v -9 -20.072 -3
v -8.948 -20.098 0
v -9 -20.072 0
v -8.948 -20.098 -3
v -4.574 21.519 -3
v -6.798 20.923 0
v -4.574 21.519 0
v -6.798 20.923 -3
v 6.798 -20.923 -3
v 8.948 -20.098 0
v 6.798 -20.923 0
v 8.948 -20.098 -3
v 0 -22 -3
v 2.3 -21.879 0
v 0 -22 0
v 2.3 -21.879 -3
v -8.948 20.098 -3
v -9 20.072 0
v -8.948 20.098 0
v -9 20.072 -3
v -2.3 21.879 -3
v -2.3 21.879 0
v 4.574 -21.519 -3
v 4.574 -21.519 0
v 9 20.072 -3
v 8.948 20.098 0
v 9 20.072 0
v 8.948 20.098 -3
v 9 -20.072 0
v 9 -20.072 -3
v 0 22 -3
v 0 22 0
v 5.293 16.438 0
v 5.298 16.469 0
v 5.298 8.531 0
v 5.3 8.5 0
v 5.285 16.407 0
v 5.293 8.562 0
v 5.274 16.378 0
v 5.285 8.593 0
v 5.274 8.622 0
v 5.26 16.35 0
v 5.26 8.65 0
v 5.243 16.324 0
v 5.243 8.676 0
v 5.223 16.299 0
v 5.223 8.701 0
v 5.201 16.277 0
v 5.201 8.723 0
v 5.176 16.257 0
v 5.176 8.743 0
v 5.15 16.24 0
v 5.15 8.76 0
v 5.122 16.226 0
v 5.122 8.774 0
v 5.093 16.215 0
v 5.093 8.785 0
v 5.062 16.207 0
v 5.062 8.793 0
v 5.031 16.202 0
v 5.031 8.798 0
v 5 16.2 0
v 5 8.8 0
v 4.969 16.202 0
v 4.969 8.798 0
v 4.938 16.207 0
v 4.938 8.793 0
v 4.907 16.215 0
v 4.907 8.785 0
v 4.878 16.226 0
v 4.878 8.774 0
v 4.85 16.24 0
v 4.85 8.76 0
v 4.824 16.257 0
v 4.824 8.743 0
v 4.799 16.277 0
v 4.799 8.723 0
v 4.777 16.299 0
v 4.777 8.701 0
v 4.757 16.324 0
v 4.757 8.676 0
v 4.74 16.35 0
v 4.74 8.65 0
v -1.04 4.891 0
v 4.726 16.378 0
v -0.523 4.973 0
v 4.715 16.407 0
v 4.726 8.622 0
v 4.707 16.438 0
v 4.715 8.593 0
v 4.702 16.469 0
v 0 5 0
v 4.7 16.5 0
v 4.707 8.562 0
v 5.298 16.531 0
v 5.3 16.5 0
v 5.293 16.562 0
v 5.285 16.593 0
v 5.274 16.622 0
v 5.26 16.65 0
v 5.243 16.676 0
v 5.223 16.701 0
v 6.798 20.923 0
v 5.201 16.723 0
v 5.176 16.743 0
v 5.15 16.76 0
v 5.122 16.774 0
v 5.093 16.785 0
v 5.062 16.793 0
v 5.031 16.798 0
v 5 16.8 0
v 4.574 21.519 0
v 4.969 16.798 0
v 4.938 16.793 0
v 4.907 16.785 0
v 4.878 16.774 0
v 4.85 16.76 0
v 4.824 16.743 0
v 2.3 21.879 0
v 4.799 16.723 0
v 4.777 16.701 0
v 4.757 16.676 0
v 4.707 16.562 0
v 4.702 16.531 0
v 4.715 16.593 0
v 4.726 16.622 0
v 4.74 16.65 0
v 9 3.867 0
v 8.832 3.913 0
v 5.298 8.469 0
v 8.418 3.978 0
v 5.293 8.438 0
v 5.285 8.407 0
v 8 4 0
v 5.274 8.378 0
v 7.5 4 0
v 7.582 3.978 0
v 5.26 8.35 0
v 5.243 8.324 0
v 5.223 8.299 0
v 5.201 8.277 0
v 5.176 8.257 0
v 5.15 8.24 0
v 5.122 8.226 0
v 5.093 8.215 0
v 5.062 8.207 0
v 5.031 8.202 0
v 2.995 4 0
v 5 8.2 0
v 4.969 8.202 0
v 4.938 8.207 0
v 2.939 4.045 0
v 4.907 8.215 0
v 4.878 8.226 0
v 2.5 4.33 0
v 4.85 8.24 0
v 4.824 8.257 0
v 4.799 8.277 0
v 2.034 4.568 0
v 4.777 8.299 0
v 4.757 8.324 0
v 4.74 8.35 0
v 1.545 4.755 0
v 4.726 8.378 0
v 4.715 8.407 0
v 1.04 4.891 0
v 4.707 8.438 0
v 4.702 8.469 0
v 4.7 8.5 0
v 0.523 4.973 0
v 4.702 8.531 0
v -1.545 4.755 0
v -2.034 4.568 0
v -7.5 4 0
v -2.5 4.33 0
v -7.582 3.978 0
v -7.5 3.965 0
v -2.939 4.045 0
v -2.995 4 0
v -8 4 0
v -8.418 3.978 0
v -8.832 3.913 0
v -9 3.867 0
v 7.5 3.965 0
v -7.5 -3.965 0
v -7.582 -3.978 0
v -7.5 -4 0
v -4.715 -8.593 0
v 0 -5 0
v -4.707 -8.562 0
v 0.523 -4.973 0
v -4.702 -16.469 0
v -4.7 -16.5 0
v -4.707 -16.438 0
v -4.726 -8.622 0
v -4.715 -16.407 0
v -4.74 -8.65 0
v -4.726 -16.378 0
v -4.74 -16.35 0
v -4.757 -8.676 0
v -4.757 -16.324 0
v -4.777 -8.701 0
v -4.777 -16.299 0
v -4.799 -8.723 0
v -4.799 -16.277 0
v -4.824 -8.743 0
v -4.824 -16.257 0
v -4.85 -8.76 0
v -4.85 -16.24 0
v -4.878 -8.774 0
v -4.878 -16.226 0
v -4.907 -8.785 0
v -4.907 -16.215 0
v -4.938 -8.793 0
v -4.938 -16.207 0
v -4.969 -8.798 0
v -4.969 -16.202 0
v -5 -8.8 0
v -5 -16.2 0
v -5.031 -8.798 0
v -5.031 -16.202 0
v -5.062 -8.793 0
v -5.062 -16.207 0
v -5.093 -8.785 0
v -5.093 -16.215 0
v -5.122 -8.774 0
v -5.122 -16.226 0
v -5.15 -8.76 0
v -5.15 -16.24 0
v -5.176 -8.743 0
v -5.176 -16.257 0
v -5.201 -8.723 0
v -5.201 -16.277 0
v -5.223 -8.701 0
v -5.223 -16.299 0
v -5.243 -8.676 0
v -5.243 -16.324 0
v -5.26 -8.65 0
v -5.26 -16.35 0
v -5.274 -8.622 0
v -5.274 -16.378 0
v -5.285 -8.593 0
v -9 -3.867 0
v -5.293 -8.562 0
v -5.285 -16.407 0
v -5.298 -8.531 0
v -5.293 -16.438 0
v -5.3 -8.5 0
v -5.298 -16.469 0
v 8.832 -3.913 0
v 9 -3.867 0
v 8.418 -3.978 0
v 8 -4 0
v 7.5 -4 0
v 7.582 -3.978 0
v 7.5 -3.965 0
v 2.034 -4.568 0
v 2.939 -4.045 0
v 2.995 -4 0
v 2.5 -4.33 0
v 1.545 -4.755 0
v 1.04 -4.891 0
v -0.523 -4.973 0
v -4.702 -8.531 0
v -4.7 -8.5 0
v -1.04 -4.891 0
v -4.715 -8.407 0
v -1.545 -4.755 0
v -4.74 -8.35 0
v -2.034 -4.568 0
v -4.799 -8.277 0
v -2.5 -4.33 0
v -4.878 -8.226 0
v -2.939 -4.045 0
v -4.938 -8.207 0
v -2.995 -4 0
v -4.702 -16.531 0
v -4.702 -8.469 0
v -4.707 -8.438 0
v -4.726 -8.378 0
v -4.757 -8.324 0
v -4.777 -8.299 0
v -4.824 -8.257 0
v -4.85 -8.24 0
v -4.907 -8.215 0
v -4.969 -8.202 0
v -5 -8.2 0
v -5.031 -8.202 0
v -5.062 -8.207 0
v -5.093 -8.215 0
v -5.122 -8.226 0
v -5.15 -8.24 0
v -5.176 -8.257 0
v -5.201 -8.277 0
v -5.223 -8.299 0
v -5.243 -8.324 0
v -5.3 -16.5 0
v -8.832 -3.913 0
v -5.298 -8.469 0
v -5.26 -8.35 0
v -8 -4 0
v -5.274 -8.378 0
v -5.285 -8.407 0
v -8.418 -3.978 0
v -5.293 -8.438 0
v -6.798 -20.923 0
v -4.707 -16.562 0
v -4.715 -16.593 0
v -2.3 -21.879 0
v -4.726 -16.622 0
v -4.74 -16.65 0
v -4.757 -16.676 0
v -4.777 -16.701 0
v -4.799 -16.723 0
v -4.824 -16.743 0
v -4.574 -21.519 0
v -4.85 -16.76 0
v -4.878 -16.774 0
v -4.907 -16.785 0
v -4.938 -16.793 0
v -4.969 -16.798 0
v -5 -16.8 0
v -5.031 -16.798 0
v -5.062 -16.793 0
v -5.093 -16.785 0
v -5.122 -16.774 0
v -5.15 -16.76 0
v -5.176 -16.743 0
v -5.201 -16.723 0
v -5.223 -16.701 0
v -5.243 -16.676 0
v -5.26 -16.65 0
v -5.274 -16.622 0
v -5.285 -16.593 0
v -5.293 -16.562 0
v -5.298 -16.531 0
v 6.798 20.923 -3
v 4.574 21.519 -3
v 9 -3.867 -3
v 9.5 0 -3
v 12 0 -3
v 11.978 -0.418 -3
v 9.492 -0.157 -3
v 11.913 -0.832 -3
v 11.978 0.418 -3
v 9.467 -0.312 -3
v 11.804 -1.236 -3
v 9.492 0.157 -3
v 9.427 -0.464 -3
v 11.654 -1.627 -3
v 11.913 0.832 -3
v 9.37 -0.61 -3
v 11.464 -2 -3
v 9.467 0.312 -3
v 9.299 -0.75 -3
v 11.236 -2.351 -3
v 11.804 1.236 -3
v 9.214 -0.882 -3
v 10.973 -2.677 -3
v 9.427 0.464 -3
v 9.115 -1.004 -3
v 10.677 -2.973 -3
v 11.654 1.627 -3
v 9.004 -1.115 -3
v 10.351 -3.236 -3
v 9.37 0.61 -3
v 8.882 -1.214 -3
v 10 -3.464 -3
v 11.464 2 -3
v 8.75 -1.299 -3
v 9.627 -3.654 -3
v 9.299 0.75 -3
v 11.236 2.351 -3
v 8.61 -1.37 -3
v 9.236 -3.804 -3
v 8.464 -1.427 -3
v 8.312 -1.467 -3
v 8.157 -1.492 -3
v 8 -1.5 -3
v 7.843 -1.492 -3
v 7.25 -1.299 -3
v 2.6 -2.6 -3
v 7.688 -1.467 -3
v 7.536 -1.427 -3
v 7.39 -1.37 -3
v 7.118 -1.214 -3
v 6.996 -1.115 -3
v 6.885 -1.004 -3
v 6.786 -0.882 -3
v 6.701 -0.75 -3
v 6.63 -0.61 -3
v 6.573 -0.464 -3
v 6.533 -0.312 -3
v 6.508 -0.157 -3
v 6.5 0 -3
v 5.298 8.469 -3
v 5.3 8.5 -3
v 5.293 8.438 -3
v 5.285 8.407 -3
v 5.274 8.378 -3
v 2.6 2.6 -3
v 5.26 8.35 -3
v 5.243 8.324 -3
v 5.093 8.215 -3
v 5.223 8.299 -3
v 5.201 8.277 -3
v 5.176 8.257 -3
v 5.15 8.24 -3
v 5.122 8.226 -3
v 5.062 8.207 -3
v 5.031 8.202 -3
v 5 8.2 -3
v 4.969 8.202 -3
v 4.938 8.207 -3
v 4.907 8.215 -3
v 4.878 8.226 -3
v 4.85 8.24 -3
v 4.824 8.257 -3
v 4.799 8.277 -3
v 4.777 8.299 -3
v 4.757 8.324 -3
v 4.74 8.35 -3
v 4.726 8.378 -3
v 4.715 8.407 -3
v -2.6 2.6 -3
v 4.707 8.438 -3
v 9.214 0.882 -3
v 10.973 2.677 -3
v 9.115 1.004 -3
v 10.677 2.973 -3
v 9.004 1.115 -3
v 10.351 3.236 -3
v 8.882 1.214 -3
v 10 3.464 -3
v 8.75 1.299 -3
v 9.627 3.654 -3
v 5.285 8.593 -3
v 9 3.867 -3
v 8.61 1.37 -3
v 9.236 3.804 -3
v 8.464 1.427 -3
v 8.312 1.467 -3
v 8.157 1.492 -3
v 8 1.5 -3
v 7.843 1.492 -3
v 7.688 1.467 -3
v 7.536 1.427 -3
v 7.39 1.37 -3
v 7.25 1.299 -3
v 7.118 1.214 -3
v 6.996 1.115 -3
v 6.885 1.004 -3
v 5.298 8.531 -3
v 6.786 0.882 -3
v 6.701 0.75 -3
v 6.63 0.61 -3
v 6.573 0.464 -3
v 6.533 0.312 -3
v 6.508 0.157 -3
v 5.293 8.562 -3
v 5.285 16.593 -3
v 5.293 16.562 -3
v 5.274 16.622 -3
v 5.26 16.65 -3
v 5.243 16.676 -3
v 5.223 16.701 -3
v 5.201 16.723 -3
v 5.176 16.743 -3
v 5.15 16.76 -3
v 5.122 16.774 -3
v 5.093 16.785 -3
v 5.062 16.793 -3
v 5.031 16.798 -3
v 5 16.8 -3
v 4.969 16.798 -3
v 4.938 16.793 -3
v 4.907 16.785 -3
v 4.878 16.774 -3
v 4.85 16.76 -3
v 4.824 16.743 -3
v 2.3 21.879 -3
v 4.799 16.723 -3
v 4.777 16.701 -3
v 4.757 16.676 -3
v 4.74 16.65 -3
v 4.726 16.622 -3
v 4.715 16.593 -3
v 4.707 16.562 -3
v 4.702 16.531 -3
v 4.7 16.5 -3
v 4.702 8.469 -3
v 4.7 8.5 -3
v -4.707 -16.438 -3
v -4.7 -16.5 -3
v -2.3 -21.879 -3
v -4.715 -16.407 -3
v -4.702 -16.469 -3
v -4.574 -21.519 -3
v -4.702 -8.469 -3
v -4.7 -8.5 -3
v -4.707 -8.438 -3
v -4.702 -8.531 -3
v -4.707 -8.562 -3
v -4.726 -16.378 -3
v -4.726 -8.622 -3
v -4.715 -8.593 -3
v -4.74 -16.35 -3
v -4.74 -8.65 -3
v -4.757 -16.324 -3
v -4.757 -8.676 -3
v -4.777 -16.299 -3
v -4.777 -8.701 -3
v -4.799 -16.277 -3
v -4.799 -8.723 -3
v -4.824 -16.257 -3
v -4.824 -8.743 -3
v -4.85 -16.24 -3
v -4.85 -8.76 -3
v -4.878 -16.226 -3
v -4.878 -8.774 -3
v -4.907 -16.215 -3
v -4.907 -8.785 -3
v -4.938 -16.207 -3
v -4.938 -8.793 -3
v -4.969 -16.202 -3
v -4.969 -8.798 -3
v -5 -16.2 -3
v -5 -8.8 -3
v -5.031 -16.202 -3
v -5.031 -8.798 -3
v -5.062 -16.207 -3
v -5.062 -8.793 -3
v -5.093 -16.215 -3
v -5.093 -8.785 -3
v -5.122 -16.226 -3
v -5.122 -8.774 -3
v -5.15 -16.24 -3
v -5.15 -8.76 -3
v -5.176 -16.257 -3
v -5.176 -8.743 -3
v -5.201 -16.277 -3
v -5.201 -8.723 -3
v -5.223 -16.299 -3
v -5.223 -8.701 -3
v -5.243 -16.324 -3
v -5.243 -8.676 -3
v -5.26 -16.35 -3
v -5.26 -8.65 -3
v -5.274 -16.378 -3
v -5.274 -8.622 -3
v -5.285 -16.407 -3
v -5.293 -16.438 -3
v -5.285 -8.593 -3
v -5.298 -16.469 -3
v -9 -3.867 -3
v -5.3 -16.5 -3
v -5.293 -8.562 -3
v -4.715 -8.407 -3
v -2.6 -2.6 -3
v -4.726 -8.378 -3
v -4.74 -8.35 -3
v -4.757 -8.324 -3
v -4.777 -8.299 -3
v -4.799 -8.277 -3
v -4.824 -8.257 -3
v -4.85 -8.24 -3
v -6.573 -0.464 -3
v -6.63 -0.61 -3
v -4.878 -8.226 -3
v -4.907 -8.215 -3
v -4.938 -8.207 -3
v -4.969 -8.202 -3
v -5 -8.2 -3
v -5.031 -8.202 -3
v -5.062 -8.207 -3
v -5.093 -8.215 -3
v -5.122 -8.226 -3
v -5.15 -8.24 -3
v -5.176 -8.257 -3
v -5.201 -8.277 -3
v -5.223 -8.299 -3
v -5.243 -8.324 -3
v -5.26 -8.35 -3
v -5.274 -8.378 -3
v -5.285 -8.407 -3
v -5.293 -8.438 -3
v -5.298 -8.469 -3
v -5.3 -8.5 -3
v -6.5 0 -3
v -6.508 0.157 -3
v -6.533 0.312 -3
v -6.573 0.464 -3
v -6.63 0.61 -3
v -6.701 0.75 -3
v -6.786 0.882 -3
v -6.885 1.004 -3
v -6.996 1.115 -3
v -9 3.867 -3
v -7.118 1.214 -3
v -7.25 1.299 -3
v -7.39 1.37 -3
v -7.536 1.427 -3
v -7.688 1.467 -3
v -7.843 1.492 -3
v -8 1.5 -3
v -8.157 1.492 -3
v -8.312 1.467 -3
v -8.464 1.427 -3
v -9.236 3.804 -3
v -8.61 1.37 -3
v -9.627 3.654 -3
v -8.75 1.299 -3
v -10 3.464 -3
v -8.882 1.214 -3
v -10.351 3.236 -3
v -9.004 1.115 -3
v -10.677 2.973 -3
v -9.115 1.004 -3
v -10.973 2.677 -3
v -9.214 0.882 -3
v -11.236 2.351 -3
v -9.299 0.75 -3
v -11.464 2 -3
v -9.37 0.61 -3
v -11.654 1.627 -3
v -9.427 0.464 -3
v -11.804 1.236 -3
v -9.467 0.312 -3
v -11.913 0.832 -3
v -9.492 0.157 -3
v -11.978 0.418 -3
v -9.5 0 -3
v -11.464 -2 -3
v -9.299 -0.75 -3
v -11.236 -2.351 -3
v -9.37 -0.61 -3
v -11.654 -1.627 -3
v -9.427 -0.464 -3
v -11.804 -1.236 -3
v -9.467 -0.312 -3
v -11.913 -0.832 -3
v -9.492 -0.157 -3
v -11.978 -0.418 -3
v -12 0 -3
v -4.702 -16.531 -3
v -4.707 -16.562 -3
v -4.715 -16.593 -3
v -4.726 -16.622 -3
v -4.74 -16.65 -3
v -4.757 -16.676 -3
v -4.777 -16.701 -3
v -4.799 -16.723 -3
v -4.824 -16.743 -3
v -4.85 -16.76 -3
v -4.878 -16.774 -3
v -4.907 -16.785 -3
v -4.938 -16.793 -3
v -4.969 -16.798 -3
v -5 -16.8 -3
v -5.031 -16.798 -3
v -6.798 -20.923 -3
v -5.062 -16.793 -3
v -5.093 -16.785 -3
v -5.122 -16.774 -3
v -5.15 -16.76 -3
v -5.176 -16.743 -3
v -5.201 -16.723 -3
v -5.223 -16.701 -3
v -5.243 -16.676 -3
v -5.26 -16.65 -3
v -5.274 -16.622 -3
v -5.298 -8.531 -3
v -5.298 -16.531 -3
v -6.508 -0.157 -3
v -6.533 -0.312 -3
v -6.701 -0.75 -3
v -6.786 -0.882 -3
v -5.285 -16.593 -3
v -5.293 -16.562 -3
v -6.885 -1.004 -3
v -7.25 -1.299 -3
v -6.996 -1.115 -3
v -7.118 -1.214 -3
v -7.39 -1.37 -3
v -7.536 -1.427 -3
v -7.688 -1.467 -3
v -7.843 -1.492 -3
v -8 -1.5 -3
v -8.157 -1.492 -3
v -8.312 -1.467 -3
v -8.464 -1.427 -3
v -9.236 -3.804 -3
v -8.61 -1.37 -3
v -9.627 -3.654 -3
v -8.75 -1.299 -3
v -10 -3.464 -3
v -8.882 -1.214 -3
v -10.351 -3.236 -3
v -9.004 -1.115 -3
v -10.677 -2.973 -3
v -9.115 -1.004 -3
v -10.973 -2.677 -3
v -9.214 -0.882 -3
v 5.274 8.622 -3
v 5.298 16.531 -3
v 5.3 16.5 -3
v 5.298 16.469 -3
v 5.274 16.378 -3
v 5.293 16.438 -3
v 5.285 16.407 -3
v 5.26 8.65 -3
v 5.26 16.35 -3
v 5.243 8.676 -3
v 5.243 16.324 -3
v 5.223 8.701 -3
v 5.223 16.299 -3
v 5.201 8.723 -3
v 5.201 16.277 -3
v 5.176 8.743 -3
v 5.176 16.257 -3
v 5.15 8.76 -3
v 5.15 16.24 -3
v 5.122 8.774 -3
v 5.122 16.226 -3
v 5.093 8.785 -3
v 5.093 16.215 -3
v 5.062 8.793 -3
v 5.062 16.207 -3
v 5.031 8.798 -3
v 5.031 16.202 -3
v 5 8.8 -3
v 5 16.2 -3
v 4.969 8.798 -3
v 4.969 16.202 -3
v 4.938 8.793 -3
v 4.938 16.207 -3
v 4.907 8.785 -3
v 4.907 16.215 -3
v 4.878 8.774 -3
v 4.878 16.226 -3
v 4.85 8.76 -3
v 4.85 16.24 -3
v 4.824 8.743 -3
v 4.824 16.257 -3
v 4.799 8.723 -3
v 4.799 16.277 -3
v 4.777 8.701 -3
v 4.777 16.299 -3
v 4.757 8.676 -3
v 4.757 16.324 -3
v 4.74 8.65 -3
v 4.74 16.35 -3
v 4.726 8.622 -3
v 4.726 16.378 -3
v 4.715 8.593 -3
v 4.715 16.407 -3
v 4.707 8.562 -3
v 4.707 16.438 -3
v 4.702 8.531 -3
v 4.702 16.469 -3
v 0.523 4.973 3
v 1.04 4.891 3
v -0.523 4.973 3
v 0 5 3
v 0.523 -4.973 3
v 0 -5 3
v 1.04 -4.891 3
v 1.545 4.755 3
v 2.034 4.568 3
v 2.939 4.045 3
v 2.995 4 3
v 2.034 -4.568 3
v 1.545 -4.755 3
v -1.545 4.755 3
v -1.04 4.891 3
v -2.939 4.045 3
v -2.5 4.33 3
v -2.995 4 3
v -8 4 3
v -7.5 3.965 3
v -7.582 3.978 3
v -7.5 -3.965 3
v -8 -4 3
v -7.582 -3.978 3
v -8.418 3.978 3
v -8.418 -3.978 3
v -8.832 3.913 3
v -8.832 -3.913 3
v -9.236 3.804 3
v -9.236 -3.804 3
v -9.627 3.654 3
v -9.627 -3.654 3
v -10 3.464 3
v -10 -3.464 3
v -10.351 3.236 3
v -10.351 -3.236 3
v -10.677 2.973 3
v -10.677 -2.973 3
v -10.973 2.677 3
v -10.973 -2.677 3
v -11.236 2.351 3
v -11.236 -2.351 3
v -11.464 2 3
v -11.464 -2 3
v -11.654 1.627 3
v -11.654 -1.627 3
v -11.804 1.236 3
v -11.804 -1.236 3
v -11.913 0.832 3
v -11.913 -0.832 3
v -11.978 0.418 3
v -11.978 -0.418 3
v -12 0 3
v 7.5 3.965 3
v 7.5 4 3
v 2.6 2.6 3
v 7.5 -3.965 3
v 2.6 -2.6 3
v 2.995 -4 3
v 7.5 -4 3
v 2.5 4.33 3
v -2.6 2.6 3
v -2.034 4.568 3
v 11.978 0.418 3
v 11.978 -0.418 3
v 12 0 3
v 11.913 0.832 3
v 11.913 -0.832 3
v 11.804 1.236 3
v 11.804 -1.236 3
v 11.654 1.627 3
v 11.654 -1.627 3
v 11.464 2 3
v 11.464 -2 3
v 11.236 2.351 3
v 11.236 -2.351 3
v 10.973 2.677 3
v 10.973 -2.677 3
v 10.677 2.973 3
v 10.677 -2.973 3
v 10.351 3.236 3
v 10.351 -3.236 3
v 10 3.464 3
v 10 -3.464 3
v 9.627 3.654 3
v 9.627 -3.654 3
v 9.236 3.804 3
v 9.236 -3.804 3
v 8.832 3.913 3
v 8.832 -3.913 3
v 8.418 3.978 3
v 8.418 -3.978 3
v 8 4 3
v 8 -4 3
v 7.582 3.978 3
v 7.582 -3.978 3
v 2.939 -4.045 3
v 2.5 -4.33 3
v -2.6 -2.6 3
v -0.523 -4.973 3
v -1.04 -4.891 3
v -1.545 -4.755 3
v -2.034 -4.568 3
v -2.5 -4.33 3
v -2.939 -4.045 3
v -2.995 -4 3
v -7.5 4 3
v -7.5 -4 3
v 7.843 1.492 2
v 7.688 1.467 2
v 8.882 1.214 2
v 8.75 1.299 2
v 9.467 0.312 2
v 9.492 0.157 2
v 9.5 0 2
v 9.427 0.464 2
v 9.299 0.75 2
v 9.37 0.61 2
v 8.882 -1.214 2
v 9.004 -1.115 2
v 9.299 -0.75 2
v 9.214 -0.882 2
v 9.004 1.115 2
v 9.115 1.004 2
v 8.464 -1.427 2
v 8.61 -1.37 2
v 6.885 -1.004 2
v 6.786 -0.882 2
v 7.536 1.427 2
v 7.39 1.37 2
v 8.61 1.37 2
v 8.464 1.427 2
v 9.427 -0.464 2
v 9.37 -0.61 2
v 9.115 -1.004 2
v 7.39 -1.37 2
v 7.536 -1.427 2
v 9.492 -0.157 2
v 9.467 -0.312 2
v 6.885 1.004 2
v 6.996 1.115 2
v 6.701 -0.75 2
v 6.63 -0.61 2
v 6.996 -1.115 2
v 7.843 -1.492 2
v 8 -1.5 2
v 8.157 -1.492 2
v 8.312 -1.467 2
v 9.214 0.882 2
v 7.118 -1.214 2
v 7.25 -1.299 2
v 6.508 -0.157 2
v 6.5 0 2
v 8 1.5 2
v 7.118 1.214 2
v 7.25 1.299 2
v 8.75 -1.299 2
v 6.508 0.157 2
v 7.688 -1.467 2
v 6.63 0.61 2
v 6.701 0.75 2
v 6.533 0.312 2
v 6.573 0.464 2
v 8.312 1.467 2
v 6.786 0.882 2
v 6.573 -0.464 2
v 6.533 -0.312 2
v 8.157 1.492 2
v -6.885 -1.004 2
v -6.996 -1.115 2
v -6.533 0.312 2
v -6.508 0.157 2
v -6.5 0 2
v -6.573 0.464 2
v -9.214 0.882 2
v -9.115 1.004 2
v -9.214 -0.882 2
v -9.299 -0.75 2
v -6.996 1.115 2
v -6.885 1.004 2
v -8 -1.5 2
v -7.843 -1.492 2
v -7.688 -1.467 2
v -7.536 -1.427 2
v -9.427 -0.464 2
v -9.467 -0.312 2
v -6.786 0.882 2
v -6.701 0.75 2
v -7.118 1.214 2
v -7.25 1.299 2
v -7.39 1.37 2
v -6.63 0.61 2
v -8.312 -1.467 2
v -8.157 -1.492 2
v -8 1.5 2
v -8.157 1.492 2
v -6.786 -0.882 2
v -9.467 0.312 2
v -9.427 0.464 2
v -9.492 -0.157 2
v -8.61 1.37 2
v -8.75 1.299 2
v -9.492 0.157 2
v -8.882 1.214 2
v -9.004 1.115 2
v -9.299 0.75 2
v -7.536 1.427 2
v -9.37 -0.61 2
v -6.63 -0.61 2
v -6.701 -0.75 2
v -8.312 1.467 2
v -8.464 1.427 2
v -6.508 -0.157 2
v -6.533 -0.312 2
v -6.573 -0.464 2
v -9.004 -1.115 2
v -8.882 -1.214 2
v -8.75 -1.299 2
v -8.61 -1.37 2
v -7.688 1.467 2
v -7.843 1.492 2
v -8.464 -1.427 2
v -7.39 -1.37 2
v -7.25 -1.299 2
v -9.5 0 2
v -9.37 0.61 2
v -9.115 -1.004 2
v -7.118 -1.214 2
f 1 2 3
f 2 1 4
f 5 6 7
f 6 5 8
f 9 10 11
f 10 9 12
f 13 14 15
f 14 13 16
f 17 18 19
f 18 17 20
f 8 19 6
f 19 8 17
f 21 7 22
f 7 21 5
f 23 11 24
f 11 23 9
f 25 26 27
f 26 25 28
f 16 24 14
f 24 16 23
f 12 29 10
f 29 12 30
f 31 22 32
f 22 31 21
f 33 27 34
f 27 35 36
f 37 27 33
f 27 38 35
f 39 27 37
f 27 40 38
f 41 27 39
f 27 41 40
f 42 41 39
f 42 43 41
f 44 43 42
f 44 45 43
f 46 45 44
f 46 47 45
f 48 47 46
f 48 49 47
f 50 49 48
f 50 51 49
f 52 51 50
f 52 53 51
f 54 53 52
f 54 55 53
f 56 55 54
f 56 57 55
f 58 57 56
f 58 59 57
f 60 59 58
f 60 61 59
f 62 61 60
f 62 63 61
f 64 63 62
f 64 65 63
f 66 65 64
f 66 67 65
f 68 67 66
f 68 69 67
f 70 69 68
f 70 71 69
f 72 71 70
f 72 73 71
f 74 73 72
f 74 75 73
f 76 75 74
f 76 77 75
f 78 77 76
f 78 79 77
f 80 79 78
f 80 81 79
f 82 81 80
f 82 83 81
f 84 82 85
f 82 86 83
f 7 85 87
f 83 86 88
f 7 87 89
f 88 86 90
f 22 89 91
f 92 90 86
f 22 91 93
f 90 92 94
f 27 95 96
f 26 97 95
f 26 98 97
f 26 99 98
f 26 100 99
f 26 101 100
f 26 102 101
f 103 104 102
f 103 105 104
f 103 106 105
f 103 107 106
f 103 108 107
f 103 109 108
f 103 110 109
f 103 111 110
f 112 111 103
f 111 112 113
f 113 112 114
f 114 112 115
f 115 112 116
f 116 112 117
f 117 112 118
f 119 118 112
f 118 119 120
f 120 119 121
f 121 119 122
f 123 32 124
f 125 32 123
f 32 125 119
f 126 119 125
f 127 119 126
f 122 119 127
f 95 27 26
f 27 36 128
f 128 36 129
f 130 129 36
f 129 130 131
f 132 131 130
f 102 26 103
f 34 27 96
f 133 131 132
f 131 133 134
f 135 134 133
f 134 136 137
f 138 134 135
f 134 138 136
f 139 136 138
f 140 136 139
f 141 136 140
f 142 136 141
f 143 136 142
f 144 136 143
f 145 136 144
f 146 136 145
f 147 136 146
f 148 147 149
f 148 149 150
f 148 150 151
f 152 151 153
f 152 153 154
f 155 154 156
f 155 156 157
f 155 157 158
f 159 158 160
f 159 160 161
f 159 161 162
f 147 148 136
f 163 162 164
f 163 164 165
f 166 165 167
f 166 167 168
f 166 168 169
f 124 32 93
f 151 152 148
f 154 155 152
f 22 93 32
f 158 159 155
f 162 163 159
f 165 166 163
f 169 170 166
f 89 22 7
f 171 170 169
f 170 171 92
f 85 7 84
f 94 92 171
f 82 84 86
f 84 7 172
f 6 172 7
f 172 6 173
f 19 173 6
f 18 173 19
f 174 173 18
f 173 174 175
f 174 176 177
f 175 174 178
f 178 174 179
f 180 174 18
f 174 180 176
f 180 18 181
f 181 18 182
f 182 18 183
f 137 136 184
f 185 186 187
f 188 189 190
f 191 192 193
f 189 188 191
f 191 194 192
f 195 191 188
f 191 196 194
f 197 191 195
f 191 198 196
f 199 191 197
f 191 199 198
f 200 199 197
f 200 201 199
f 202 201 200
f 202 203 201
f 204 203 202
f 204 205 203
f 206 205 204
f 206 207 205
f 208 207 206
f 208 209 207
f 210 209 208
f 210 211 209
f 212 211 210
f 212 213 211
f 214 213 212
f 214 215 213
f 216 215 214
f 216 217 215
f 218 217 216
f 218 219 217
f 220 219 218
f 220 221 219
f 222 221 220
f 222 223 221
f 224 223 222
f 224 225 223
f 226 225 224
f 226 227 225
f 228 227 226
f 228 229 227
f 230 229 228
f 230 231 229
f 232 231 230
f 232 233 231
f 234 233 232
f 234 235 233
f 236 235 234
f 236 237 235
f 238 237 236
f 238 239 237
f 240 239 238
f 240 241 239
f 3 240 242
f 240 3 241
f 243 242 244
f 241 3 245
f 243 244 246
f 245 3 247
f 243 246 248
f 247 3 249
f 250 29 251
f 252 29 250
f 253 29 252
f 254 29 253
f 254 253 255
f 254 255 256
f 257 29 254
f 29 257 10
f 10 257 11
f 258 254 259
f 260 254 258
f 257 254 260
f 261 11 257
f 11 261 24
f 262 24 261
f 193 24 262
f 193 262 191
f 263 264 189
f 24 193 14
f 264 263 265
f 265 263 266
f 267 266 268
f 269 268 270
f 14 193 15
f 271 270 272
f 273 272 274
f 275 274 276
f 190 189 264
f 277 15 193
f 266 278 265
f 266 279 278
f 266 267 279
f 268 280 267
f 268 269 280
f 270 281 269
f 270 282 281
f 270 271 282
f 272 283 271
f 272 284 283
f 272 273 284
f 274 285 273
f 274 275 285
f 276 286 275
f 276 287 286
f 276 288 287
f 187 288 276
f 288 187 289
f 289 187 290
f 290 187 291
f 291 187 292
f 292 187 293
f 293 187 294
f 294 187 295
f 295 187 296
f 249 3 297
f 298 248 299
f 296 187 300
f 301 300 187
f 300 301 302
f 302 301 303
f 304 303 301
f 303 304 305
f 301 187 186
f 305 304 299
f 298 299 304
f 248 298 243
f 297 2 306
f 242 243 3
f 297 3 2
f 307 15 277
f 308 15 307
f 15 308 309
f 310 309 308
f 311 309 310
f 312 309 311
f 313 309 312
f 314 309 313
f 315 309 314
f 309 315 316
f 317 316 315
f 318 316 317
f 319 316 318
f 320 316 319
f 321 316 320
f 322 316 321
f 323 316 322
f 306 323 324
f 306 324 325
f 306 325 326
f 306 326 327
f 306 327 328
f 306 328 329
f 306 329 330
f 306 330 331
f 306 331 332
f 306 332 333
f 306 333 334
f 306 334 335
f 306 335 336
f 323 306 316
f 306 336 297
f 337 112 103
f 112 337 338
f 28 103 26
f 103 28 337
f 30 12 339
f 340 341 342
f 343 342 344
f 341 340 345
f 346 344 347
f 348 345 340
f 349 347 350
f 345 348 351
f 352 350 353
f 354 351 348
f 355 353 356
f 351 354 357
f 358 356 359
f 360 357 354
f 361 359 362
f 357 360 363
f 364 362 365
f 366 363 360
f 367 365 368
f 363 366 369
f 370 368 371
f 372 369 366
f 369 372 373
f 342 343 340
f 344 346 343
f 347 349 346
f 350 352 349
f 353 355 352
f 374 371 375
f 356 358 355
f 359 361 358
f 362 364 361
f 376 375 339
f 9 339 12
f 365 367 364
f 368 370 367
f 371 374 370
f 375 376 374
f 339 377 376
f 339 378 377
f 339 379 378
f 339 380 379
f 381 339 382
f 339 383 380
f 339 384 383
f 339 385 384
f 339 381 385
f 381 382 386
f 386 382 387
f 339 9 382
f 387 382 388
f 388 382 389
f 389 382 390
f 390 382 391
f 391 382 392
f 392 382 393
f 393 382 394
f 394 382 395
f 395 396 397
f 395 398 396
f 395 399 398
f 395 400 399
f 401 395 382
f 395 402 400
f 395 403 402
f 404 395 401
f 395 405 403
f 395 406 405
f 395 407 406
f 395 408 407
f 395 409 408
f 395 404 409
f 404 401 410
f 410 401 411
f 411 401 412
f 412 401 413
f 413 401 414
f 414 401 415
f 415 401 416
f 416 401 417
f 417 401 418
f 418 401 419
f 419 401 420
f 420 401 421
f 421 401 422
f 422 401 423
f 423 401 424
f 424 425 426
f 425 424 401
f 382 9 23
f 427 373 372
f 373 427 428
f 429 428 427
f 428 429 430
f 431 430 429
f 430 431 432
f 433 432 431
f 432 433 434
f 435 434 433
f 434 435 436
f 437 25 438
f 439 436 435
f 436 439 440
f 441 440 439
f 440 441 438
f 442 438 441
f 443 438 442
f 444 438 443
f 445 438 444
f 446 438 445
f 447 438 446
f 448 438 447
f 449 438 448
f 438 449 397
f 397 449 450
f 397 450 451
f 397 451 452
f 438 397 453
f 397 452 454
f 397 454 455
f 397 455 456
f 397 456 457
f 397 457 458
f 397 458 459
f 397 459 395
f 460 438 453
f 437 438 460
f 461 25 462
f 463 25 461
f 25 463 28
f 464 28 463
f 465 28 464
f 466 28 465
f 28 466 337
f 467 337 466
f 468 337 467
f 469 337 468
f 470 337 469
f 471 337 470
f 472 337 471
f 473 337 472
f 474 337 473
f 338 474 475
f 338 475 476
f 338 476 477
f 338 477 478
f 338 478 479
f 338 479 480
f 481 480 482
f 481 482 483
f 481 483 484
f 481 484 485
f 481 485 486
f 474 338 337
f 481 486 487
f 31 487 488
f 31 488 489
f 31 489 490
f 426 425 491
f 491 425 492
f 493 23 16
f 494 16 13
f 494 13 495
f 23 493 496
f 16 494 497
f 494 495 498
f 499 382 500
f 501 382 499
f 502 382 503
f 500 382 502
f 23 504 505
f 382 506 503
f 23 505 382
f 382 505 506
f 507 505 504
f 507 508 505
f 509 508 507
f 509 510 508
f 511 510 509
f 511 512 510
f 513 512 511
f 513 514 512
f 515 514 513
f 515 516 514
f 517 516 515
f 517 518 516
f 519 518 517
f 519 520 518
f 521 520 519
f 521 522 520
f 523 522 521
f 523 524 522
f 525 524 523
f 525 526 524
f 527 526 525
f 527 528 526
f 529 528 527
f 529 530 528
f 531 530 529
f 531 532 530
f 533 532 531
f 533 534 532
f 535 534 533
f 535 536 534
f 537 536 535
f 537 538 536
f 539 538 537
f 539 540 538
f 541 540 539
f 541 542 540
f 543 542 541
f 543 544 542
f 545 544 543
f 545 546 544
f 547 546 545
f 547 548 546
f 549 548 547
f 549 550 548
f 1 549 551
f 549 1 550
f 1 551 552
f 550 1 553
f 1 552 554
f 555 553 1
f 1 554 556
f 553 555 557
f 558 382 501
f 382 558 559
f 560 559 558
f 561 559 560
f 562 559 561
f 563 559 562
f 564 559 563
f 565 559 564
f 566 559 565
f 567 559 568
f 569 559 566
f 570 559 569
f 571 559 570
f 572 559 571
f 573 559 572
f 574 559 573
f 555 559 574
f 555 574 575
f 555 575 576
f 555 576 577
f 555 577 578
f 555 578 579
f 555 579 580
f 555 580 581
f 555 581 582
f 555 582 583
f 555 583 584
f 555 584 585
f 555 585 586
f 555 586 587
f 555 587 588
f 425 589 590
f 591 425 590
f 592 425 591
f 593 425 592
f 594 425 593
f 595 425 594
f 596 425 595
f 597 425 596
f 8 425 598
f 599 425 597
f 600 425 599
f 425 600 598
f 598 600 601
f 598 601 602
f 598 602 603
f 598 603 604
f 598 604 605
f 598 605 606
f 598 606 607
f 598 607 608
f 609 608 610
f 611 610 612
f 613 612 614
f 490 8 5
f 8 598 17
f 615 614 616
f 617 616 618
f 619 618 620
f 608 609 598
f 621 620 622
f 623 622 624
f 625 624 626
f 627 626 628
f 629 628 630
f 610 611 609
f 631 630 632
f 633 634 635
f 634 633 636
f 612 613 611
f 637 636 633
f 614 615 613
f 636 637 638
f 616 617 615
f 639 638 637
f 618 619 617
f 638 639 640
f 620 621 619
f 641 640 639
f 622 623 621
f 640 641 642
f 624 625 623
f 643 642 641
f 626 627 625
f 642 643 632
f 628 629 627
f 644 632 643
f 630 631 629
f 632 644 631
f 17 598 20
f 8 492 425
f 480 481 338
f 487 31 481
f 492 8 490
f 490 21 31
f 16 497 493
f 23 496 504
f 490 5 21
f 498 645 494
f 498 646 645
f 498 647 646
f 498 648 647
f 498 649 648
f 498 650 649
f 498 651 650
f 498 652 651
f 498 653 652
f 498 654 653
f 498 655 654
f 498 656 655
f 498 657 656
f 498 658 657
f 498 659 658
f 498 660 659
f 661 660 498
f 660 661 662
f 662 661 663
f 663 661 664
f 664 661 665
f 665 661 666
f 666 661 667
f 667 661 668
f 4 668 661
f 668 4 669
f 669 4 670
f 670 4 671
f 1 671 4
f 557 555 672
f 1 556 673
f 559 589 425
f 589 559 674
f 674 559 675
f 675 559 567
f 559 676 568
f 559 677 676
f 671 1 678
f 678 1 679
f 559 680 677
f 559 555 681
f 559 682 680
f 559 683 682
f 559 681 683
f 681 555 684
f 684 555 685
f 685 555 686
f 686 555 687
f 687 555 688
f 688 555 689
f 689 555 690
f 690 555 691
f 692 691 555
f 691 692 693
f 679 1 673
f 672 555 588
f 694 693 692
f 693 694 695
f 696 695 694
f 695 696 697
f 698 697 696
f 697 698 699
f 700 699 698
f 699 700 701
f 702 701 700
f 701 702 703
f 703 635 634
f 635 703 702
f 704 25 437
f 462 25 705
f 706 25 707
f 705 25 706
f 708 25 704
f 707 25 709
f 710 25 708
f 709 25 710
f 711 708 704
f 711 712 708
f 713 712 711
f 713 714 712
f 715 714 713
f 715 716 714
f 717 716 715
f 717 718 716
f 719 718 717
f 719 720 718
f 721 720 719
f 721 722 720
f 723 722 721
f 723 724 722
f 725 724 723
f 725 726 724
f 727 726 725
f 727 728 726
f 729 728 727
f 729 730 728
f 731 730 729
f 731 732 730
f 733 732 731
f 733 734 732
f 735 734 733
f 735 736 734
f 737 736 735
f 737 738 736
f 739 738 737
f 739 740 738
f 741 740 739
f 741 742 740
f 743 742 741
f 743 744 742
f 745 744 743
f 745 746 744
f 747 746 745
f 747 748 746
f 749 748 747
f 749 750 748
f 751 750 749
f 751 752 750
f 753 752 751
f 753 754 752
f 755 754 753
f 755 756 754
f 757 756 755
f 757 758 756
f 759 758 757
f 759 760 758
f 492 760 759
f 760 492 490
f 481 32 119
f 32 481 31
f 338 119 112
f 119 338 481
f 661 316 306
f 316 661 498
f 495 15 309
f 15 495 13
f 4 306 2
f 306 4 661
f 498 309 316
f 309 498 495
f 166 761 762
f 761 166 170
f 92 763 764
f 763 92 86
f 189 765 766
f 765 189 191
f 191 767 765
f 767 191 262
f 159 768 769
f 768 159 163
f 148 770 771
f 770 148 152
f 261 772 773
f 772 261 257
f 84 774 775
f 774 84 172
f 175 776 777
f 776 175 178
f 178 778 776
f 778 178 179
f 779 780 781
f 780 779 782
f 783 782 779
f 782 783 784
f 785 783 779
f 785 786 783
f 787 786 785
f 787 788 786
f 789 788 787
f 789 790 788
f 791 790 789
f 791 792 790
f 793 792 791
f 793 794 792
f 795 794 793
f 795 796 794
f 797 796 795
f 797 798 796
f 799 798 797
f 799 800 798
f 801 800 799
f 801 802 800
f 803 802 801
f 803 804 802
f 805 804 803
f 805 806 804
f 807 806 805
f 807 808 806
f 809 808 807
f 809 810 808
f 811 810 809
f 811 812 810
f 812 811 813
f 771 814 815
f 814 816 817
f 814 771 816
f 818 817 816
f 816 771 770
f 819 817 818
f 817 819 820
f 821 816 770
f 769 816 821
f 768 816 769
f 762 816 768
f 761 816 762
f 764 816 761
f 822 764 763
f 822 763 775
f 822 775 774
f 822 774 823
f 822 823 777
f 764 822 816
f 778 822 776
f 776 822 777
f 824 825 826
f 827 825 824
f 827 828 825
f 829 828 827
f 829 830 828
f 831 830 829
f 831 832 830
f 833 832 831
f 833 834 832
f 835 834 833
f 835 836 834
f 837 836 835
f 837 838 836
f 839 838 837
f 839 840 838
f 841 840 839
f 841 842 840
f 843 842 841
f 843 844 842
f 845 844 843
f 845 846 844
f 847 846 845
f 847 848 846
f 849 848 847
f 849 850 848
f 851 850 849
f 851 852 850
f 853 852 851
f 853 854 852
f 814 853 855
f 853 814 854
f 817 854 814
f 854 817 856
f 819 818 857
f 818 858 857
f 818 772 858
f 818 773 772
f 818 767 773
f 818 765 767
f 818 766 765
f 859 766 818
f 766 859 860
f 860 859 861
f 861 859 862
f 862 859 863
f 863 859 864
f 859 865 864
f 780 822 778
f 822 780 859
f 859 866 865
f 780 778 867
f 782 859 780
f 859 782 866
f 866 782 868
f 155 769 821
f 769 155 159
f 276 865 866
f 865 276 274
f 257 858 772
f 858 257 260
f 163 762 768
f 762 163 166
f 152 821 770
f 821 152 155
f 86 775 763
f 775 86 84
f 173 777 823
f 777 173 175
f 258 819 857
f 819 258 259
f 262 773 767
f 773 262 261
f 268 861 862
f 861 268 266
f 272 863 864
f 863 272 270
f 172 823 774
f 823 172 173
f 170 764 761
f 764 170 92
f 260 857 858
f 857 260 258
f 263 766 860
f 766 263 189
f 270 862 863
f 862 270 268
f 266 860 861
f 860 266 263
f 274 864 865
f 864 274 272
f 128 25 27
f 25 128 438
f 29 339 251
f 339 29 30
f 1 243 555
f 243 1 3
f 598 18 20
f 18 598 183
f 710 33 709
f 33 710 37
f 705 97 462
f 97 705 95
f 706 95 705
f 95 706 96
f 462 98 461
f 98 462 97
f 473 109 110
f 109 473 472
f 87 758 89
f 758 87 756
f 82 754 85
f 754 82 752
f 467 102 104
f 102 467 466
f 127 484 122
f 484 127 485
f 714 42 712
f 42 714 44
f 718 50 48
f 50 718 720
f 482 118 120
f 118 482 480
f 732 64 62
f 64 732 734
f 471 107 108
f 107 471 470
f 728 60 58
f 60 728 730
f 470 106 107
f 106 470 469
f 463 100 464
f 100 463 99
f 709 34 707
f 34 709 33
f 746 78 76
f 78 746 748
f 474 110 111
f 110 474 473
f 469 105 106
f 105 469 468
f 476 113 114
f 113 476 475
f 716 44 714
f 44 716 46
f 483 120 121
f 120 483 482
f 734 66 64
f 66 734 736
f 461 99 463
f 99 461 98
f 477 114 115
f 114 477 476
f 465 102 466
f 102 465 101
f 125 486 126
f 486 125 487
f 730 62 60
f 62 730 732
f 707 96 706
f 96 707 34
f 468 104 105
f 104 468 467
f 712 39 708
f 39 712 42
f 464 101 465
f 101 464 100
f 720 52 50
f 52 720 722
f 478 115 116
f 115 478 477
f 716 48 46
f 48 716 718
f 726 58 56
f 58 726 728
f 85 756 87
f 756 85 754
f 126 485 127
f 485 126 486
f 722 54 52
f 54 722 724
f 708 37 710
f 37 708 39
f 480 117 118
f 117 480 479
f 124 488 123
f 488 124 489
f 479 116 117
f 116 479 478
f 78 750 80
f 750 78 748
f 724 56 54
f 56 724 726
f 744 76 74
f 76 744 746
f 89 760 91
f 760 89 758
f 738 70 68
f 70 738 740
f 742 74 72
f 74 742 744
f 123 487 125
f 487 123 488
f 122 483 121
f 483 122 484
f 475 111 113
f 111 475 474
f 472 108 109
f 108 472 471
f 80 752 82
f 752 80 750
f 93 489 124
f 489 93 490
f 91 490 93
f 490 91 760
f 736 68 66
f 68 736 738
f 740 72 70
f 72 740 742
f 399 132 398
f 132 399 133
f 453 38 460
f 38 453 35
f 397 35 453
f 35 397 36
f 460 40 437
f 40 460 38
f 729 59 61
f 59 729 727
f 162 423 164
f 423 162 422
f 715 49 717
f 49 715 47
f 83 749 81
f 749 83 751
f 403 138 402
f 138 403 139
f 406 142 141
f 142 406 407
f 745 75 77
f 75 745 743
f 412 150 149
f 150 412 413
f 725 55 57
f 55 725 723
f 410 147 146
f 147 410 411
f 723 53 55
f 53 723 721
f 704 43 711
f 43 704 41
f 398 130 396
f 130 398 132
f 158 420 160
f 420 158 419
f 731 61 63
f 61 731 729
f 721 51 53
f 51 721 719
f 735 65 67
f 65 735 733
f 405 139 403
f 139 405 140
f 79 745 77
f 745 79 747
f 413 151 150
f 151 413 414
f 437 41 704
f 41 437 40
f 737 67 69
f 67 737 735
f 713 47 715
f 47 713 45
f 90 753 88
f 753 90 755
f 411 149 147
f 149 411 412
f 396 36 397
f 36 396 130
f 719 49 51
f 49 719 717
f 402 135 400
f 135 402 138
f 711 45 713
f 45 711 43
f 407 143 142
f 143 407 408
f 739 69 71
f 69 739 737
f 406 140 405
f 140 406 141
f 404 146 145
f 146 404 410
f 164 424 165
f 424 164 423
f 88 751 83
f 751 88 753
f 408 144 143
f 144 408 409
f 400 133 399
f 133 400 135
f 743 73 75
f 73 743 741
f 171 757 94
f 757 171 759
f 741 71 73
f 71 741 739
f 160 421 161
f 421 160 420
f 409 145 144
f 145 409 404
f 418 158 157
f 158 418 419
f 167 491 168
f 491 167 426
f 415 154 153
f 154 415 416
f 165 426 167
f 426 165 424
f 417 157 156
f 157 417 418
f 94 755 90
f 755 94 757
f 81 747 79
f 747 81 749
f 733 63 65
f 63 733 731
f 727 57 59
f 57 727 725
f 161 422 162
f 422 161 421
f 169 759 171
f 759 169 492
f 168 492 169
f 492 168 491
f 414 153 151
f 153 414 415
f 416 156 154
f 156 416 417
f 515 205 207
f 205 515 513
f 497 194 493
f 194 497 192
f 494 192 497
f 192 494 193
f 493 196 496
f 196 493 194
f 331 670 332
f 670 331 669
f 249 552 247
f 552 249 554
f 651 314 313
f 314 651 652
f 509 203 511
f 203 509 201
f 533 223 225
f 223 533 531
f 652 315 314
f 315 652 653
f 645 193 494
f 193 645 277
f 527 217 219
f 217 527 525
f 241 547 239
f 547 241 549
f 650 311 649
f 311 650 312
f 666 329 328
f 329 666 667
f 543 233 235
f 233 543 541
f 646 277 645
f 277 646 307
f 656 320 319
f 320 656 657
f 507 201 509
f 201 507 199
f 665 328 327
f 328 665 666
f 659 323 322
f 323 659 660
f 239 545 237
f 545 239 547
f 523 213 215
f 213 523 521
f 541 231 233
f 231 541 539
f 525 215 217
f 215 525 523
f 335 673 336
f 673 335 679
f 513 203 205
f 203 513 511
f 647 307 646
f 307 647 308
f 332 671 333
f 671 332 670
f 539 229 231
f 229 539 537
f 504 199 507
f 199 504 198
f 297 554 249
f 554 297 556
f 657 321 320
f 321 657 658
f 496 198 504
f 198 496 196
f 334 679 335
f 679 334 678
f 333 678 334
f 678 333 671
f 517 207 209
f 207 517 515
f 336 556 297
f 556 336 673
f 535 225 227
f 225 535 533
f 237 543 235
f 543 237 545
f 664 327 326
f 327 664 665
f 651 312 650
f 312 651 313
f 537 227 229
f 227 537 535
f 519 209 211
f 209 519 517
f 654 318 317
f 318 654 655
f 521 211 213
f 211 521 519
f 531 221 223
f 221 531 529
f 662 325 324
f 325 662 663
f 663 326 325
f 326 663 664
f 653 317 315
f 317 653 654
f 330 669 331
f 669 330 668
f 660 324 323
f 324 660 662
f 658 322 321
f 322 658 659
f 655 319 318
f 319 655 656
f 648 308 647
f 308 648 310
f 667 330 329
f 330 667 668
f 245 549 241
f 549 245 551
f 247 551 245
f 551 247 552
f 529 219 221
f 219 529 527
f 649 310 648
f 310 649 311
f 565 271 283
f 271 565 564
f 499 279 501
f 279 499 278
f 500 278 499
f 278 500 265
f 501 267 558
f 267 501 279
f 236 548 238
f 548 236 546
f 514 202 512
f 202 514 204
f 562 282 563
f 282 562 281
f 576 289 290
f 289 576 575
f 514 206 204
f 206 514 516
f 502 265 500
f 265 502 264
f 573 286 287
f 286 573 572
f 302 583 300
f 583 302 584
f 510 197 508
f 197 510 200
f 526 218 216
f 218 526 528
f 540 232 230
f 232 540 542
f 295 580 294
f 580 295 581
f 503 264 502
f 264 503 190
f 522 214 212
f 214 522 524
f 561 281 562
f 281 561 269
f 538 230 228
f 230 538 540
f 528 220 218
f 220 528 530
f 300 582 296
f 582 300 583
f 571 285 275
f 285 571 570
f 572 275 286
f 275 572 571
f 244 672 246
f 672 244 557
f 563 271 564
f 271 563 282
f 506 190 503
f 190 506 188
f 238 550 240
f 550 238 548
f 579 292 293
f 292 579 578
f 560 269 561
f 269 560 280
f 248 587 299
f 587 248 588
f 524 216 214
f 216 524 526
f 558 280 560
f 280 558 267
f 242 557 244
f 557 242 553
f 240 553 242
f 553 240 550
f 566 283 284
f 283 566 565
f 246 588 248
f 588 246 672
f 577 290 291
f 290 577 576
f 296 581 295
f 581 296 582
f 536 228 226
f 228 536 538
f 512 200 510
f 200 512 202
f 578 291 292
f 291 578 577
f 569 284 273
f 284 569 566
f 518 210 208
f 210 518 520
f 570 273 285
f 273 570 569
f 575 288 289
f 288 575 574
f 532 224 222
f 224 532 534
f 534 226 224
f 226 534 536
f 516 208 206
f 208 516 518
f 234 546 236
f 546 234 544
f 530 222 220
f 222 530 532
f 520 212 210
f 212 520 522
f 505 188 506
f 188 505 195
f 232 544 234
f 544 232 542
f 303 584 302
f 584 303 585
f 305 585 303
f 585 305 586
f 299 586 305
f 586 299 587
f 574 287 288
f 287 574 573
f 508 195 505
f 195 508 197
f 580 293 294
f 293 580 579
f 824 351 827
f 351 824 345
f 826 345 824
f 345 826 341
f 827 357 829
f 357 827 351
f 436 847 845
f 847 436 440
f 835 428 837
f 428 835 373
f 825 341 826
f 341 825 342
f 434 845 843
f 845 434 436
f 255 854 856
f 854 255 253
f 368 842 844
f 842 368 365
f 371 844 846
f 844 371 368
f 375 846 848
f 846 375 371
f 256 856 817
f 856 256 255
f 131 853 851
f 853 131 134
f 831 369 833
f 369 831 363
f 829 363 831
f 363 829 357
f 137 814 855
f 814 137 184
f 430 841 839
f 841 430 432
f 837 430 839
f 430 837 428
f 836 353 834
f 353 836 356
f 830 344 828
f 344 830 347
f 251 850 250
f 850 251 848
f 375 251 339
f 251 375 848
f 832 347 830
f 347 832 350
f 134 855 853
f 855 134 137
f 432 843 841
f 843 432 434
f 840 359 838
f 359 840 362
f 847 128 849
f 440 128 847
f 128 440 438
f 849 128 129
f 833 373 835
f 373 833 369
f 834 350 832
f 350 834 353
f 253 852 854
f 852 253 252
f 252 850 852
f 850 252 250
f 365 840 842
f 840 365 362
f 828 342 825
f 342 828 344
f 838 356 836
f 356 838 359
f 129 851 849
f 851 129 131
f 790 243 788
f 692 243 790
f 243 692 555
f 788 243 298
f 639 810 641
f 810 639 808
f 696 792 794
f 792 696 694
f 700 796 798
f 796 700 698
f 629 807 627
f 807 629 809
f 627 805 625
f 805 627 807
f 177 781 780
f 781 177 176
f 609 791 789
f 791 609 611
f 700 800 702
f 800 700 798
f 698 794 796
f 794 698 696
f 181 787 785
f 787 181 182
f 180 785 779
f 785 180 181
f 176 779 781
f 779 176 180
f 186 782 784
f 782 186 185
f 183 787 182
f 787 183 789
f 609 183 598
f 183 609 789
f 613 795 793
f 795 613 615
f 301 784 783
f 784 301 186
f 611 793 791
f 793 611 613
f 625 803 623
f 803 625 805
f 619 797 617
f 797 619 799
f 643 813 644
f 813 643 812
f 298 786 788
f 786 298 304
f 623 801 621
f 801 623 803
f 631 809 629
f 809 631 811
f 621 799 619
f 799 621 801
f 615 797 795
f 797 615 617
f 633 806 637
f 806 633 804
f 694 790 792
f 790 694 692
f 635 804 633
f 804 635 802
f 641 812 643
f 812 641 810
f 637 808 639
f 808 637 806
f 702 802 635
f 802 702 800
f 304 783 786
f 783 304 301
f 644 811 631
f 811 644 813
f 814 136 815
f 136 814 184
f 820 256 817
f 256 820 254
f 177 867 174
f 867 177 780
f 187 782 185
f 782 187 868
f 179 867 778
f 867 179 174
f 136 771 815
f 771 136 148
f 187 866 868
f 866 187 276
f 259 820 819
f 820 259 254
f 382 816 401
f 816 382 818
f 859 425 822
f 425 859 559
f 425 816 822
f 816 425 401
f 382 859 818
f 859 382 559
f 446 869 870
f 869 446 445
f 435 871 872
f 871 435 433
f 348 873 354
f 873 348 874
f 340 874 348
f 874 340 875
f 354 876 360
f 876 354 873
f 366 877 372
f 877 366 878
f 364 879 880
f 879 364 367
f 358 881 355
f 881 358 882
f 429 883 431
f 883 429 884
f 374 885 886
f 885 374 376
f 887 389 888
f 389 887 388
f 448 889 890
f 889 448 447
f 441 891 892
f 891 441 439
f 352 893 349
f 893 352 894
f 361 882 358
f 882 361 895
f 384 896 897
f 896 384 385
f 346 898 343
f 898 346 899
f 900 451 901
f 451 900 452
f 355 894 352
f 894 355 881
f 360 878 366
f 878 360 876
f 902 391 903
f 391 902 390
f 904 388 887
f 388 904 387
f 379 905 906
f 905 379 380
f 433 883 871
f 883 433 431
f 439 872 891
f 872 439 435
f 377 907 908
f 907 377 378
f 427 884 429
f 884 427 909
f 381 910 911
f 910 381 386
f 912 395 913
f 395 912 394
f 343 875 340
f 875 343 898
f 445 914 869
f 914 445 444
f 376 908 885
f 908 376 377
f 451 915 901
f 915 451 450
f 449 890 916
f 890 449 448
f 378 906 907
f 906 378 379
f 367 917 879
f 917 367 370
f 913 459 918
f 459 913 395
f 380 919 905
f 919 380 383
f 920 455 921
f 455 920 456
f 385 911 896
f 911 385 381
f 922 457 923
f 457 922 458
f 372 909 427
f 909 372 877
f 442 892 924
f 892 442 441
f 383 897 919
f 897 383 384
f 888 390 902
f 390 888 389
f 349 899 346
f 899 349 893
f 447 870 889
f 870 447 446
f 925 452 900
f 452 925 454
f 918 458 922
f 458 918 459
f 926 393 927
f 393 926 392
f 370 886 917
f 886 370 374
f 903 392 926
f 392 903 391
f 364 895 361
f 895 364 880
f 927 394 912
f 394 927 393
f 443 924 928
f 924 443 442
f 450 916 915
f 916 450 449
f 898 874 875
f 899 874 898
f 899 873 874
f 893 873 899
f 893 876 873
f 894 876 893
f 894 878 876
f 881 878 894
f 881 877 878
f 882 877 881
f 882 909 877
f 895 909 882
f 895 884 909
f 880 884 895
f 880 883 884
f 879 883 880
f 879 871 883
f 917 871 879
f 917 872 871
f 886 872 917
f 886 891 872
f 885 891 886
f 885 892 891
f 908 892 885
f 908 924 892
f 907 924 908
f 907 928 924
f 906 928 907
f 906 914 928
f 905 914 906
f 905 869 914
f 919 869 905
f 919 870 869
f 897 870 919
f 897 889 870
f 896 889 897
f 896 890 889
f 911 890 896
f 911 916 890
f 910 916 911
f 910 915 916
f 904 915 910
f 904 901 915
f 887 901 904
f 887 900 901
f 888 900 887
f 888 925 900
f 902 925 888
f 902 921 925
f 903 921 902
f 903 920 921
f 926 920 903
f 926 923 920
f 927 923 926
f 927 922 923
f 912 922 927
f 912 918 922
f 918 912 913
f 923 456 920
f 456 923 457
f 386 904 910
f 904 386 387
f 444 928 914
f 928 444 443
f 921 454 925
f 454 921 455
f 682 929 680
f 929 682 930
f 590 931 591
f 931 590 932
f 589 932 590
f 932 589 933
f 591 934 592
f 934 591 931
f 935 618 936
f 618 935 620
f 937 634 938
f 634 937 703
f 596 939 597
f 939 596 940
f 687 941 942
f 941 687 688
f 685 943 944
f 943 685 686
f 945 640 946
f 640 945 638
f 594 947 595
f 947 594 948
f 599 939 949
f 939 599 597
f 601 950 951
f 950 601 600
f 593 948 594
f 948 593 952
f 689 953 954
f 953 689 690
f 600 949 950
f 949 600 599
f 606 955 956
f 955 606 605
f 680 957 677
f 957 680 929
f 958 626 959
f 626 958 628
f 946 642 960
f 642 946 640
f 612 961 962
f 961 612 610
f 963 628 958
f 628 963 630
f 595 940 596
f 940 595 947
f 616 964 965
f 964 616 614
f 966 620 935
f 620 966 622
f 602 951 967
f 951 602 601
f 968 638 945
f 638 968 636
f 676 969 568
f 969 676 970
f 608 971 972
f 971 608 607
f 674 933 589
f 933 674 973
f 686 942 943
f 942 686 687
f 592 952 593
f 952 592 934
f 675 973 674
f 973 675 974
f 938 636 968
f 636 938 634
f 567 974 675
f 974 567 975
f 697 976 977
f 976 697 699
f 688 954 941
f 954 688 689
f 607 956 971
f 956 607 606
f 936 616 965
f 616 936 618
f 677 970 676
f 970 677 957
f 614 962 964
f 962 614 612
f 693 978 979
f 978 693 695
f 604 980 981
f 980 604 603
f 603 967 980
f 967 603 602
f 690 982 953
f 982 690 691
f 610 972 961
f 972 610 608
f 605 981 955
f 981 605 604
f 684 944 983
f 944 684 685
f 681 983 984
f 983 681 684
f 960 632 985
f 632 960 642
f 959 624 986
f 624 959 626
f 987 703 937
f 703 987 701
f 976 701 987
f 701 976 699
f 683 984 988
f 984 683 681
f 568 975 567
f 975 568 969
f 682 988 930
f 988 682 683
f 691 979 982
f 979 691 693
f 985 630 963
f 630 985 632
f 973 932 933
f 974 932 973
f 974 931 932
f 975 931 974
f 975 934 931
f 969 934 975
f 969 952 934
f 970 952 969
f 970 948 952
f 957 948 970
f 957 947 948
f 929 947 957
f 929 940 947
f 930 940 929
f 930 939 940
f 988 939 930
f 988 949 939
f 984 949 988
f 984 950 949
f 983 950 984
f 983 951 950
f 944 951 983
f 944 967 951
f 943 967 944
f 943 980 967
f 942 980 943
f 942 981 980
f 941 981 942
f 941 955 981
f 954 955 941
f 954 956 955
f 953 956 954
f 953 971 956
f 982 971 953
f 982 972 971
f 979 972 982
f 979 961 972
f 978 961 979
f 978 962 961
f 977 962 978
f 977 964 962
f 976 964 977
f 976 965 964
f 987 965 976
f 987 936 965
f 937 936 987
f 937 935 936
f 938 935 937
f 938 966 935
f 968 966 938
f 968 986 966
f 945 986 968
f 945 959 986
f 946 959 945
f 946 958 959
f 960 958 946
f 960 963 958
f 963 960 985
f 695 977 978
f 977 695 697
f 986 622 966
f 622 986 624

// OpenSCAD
$fn= 60;


module rotor(){
    translate([0, 0, -1.5]) cylinder(r=22, h=3, center=true);
    translate([0, 0,  1.5]) cylinder(r=5, h=3, center=true);
}

module cases(){
    translate([8, 0,  0]) cylinder(r=4, h=6, center=true);
    translate([-8, 0,  0]) cylinder(r=4, h=6, center=true);
    cube([15,8,6],center=true);
}

module base(){
  difference(){
    rotor();
    translate([33,0,0])cube([48,48,8], center=true);
    translate([-33,0,0])cube([48,48,8], center=true);
    translate([5,16.5,0]) cylinder(r=.3, h=10, center=true);
    translate([5,8.5,0]) cylinder(r=.3, h=10, center=true);
    translate([-5,-16.5,0]) cylinder(r=.3, h=10, center=true);
    translate([-5,-8.5,0]) cylinder(r=.3, h=10, center=true);
  }
}

difference(){
  union() {
    base();
    cases();
  }
  cube([5.2,5.2,8],center=true);
  translate([8,0,-1]) cylinder(r=1.5, h=6, center=true);
  translate([-8,0,-1]) cylinder(r=1.5, h=6, center=true);
}
